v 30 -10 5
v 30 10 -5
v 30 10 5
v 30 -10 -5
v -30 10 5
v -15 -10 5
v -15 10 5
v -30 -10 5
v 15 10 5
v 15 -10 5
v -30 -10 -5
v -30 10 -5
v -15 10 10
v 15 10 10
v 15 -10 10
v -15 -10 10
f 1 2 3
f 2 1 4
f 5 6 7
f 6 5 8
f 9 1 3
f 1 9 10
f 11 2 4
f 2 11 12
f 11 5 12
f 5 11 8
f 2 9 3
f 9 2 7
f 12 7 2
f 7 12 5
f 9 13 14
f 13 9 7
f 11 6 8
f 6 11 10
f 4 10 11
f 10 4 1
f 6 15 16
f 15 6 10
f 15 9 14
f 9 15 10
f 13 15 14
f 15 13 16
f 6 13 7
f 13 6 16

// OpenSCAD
cube([60,20,10],center=true);
translate([0,0,5])
cube([30,20,10],center=true);
